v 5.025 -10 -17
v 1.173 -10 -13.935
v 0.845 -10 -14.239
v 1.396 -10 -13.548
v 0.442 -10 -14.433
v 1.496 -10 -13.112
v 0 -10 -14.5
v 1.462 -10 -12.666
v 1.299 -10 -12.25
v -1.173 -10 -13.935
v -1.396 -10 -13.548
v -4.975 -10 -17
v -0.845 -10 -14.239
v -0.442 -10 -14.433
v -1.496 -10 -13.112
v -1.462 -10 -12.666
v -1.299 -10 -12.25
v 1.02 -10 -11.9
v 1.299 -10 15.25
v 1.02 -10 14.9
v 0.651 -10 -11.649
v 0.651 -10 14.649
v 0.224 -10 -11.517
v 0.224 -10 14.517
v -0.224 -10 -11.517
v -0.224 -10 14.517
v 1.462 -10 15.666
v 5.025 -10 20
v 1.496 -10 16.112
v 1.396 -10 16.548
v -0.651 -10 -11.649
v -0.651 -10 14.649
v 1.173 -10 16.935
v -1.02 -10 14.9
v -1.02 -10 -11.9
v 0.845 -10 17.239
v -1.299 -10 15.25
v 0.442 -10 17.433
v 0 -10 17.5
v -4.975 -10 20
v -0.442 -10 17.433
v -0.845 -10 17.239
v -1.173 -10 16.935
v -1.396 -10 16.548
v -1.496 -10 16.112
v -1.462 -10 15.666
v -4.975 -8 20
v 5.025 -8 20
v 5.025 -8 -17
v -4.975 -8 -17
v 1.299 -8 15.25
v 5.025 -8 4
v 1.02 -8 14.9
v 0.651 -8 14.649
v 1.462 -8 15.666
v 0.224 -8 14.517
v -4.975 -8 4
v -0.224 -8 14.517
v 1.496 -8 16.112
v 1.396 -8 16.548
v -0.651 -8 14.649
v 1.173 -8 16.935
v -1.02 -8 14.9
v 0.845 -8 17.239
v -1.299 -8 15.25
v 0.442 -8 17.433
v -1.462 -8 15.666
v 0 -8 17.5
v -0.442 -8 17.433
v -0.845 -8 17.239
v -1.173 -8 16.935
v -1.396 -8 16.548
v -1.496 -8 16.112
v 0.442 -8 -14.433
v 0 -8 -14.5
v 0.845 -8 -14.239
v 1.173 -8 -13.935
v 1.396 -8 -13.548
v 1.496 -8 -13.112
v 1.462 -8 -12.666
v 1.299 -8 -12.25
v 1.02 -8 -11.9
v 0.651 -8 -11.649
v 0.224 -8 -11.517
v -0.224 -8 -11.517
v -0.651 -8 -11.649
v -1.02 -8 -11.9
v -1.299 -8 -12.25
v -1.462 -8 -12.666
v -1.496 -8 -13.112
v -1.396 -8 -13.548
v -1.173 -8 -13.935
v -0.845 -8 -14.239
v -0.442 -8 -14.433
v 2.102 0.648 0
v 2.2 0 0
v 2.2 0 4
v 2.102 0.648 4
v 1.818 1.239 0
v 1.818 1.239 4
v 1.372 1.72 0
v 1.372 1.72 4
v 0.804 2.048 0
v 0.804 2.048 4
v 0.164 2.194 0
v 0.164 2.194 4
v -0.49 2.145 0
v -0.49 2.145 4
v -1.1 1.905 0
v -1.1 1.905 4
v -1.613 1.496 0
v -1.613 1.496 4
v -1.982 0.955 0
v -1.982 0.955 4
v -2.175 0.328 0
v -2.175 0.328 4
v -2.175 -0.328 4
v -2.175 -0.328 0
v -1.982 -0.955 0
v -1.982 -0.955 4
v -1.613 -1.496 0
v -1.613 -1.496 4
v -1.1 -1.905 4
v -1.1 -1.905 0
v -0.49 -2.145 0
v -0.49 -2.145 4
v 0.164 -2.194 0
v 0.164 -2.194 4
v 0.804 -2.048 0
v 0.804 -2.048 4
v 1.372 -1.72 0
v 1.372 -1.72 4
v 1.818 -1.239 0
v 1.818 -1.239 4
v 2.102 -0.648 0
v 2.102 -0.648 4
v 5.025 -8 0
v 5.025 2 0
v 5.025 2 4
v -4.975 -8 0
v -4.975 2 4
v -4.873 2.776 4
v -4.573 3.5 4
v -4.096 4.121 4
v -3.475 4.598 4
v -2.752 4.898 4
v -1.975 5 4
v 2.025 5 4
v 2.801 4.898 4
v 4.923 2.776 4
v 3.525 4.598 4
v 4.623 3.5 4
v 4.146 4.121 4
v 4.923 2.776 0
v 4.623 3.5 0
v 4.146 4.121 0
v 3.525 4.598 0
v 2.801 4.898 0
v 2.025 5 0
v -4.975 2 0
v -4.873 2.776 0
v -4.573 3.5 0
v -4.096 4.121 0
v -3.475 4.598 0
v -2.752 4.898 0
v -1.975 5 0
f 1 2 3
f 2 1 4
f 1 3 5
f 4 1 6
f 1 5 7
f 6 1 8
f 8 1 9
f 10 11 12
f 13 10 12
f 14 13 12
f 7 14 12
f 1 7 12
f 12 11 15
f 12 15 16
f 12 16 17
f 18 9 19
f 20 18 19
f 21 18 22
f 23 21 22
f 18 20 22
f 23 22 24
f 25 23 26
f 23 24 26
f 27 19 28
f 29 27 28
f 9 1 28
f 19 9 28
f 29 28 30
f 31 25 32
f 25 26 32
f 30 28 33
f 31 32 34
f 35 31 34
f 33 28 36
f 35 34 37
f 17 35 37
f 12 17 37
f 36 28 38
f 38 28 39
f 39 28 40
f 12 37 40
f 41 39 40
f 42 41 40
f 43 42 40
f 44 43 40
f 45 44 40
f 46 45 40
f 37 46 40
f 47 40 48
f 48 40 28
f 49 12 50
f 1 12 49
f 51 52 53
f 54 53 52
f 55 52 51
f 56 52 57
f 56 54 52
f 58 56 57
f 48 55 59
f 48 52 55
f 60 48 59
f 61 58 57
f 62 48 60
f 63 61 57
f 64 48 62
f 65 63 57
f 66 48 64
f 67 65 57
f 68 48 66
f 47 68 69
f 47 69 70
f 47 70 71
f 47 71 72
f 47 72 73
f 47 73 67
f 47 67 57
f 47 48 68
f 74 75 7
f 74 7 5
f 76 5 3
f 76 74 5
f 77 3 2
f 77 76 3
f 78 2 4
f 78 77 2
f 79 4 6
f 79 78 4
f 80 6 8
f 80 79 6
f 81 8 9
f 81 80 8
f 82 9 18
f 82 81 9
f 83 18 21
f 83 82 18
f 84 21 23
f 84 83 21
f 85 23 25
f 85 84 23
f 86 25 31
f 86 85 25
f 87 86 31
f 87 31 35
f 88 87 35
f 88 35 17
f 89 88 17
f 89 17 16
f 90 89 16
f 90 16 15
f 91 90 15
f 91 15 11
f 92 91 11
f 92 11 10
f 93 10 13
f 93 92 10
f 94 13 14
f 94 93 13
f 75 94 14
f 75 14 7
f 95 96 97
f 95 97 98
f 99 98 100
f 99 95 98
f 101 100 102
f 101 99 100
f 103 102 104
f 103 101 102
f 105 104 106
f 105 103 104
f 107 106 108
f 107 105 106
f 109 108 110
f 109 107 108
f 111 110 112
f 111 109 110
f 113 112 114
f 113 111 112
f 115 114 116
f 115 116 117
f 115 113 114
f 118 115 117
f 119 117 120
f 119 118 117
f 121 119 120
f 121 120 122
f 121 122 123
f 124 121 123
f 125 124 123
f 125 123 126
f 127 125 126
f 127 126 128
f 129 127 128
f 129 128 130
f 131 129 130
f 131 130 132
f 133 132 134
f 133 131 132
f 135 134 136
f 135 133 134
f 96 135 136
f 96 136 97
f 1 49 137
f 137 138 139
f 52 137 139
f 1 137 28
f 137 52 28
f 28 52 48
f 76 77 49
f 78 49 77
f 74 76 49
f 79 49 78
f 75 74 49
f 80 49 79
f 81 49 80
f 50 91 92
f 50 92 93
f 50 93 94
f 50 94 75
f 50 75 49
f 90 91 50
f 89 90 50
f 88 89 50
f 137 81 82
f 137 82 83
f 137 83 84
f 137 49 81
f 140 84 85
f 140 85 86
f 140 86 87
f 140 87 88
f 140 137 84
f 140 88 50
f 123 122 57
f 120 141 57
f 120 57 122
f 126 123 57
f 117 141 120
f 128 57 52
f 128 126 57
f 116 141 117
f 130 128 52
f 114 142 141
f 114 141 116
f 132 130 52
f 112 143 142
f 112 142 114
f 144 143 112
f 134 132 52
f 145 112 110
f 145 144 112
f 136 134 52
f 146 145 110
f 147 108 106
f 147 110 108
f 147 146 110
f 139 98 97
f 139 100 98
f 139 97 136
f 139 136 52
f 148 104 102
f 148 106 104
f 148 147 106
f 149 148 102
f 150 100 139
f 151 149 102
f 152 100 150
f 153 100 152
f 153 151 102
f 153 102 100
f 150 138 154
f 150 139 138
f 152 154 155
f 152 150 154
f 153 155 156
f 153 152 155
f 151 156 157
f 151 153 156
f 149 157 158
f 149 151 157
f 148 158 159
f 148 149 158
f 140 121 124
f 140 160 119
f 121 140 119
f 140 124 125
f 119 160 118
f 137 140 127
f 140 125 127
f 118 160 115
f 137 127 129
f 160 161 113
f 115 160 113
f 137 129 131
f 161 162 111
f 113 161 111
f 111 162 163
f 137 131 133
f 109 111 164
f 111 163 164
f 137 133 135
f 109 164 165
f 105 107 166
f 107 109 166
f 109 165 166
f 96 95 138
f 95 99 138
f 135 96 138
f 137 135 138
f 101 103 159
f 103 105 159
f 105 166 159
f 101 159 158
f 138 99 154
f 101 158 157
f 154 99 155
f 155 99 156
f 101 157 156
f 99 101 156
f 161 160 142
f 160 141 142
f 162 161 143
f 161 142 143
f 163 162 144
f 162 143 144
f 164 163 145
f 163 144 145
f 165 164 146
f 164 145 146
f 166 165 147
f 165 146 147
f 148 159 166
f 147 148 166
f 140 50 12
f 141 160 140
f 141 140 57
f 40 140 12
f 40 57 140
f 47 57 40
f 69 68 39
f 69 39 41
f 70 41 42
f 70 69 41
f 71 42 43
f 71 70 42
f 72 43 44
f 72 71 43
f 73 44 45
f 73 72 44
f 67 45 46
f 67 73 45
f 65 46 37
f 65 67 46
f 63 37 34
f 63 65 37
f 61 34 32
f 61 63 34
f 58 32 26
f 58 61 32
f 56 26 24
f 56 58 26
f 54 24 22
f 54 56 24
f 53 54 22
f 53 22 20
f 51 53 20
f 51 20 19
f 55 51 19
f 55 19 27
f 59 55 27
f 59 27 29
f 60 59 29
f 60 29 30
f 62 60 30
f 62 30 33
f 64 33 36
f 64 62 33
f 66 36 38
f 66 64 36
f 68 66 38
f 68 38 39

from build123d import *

# Parameters (mm, degrees)
SKETCH_1_R          = 2.2
EXTRUDE_1_DEPTH     = 4
SKETCH_2_R          = 1.5
EXTRUDE_2_DEPTH     = 2
FILLET_1_R          = 3
SKETCH_3_W          = 10
SKETCH_3_H          = 1
CUT_EXTRUDE_1_DEPTH = 10


with BuildPart() as part:
    # 草图1 → 凸台-拉伸1 (new body)
    with BuildSketch(Plane.XY):
        Polygon((-4.975166703, 0), (-4.975166703, -8), (5.024833297, -8), (5.024833297, 0), (5.024833297, 5), (-4.975166703, 5), align=None)
        Circle(SKETCH_1_R, mode=Mode.SUBTRACT)
    extrude(amount=EXTRUDE_1_DEPTH)

    # 草图2 → 凸台-拉伸2 (add)
    with BuildSketch(Plane.XZ.offset(8)):
        Polygon((5.024833297, 0), (5.024833297, -18), (-4.975166703, -18), (-4.975166703, 21), (5.024833297, 21), align=None)
        with Locations(Location((0, -13, 0), (0, 0, 270))):
            Circle(SKETCH_2_R, mode=Mode.SUBTRACT)
        with Locations(Location((0, 16, 0), (0, 0, 90))):
            Circle(SKETCH_2_R, mode=Mode.SUBTRACT)
    extrude(amount=EXTRUDE_2_DEPTH)

    # 圆角1
    fillet_1_edges = [part.edges().sort_by_distance(p)[0] for p in [
        (-4.975166703, 5, 2),
        (5.024833297, 5, 2),
    ]]
    fillet(fillet_1_edges, radius=FILLET_1_R)

    # 草图3 → 切除-拉伸1 (cut)
    with BuildSketch(Plane.XZ.offset(10)):
        with Locations((0.024833297, 20.5)):
            Rectangle(SKETCH_3_W, SKETCH_3_H)
        with Locations((0.024833297, -17.5)):
            Rectangle(SKETCH_3_W, SKETCH_3_H)
    extrude(amount=-CUT_EXTRUDE_1_DEPTH, mode=Mode.SUBTRACT)


solid = part.part
